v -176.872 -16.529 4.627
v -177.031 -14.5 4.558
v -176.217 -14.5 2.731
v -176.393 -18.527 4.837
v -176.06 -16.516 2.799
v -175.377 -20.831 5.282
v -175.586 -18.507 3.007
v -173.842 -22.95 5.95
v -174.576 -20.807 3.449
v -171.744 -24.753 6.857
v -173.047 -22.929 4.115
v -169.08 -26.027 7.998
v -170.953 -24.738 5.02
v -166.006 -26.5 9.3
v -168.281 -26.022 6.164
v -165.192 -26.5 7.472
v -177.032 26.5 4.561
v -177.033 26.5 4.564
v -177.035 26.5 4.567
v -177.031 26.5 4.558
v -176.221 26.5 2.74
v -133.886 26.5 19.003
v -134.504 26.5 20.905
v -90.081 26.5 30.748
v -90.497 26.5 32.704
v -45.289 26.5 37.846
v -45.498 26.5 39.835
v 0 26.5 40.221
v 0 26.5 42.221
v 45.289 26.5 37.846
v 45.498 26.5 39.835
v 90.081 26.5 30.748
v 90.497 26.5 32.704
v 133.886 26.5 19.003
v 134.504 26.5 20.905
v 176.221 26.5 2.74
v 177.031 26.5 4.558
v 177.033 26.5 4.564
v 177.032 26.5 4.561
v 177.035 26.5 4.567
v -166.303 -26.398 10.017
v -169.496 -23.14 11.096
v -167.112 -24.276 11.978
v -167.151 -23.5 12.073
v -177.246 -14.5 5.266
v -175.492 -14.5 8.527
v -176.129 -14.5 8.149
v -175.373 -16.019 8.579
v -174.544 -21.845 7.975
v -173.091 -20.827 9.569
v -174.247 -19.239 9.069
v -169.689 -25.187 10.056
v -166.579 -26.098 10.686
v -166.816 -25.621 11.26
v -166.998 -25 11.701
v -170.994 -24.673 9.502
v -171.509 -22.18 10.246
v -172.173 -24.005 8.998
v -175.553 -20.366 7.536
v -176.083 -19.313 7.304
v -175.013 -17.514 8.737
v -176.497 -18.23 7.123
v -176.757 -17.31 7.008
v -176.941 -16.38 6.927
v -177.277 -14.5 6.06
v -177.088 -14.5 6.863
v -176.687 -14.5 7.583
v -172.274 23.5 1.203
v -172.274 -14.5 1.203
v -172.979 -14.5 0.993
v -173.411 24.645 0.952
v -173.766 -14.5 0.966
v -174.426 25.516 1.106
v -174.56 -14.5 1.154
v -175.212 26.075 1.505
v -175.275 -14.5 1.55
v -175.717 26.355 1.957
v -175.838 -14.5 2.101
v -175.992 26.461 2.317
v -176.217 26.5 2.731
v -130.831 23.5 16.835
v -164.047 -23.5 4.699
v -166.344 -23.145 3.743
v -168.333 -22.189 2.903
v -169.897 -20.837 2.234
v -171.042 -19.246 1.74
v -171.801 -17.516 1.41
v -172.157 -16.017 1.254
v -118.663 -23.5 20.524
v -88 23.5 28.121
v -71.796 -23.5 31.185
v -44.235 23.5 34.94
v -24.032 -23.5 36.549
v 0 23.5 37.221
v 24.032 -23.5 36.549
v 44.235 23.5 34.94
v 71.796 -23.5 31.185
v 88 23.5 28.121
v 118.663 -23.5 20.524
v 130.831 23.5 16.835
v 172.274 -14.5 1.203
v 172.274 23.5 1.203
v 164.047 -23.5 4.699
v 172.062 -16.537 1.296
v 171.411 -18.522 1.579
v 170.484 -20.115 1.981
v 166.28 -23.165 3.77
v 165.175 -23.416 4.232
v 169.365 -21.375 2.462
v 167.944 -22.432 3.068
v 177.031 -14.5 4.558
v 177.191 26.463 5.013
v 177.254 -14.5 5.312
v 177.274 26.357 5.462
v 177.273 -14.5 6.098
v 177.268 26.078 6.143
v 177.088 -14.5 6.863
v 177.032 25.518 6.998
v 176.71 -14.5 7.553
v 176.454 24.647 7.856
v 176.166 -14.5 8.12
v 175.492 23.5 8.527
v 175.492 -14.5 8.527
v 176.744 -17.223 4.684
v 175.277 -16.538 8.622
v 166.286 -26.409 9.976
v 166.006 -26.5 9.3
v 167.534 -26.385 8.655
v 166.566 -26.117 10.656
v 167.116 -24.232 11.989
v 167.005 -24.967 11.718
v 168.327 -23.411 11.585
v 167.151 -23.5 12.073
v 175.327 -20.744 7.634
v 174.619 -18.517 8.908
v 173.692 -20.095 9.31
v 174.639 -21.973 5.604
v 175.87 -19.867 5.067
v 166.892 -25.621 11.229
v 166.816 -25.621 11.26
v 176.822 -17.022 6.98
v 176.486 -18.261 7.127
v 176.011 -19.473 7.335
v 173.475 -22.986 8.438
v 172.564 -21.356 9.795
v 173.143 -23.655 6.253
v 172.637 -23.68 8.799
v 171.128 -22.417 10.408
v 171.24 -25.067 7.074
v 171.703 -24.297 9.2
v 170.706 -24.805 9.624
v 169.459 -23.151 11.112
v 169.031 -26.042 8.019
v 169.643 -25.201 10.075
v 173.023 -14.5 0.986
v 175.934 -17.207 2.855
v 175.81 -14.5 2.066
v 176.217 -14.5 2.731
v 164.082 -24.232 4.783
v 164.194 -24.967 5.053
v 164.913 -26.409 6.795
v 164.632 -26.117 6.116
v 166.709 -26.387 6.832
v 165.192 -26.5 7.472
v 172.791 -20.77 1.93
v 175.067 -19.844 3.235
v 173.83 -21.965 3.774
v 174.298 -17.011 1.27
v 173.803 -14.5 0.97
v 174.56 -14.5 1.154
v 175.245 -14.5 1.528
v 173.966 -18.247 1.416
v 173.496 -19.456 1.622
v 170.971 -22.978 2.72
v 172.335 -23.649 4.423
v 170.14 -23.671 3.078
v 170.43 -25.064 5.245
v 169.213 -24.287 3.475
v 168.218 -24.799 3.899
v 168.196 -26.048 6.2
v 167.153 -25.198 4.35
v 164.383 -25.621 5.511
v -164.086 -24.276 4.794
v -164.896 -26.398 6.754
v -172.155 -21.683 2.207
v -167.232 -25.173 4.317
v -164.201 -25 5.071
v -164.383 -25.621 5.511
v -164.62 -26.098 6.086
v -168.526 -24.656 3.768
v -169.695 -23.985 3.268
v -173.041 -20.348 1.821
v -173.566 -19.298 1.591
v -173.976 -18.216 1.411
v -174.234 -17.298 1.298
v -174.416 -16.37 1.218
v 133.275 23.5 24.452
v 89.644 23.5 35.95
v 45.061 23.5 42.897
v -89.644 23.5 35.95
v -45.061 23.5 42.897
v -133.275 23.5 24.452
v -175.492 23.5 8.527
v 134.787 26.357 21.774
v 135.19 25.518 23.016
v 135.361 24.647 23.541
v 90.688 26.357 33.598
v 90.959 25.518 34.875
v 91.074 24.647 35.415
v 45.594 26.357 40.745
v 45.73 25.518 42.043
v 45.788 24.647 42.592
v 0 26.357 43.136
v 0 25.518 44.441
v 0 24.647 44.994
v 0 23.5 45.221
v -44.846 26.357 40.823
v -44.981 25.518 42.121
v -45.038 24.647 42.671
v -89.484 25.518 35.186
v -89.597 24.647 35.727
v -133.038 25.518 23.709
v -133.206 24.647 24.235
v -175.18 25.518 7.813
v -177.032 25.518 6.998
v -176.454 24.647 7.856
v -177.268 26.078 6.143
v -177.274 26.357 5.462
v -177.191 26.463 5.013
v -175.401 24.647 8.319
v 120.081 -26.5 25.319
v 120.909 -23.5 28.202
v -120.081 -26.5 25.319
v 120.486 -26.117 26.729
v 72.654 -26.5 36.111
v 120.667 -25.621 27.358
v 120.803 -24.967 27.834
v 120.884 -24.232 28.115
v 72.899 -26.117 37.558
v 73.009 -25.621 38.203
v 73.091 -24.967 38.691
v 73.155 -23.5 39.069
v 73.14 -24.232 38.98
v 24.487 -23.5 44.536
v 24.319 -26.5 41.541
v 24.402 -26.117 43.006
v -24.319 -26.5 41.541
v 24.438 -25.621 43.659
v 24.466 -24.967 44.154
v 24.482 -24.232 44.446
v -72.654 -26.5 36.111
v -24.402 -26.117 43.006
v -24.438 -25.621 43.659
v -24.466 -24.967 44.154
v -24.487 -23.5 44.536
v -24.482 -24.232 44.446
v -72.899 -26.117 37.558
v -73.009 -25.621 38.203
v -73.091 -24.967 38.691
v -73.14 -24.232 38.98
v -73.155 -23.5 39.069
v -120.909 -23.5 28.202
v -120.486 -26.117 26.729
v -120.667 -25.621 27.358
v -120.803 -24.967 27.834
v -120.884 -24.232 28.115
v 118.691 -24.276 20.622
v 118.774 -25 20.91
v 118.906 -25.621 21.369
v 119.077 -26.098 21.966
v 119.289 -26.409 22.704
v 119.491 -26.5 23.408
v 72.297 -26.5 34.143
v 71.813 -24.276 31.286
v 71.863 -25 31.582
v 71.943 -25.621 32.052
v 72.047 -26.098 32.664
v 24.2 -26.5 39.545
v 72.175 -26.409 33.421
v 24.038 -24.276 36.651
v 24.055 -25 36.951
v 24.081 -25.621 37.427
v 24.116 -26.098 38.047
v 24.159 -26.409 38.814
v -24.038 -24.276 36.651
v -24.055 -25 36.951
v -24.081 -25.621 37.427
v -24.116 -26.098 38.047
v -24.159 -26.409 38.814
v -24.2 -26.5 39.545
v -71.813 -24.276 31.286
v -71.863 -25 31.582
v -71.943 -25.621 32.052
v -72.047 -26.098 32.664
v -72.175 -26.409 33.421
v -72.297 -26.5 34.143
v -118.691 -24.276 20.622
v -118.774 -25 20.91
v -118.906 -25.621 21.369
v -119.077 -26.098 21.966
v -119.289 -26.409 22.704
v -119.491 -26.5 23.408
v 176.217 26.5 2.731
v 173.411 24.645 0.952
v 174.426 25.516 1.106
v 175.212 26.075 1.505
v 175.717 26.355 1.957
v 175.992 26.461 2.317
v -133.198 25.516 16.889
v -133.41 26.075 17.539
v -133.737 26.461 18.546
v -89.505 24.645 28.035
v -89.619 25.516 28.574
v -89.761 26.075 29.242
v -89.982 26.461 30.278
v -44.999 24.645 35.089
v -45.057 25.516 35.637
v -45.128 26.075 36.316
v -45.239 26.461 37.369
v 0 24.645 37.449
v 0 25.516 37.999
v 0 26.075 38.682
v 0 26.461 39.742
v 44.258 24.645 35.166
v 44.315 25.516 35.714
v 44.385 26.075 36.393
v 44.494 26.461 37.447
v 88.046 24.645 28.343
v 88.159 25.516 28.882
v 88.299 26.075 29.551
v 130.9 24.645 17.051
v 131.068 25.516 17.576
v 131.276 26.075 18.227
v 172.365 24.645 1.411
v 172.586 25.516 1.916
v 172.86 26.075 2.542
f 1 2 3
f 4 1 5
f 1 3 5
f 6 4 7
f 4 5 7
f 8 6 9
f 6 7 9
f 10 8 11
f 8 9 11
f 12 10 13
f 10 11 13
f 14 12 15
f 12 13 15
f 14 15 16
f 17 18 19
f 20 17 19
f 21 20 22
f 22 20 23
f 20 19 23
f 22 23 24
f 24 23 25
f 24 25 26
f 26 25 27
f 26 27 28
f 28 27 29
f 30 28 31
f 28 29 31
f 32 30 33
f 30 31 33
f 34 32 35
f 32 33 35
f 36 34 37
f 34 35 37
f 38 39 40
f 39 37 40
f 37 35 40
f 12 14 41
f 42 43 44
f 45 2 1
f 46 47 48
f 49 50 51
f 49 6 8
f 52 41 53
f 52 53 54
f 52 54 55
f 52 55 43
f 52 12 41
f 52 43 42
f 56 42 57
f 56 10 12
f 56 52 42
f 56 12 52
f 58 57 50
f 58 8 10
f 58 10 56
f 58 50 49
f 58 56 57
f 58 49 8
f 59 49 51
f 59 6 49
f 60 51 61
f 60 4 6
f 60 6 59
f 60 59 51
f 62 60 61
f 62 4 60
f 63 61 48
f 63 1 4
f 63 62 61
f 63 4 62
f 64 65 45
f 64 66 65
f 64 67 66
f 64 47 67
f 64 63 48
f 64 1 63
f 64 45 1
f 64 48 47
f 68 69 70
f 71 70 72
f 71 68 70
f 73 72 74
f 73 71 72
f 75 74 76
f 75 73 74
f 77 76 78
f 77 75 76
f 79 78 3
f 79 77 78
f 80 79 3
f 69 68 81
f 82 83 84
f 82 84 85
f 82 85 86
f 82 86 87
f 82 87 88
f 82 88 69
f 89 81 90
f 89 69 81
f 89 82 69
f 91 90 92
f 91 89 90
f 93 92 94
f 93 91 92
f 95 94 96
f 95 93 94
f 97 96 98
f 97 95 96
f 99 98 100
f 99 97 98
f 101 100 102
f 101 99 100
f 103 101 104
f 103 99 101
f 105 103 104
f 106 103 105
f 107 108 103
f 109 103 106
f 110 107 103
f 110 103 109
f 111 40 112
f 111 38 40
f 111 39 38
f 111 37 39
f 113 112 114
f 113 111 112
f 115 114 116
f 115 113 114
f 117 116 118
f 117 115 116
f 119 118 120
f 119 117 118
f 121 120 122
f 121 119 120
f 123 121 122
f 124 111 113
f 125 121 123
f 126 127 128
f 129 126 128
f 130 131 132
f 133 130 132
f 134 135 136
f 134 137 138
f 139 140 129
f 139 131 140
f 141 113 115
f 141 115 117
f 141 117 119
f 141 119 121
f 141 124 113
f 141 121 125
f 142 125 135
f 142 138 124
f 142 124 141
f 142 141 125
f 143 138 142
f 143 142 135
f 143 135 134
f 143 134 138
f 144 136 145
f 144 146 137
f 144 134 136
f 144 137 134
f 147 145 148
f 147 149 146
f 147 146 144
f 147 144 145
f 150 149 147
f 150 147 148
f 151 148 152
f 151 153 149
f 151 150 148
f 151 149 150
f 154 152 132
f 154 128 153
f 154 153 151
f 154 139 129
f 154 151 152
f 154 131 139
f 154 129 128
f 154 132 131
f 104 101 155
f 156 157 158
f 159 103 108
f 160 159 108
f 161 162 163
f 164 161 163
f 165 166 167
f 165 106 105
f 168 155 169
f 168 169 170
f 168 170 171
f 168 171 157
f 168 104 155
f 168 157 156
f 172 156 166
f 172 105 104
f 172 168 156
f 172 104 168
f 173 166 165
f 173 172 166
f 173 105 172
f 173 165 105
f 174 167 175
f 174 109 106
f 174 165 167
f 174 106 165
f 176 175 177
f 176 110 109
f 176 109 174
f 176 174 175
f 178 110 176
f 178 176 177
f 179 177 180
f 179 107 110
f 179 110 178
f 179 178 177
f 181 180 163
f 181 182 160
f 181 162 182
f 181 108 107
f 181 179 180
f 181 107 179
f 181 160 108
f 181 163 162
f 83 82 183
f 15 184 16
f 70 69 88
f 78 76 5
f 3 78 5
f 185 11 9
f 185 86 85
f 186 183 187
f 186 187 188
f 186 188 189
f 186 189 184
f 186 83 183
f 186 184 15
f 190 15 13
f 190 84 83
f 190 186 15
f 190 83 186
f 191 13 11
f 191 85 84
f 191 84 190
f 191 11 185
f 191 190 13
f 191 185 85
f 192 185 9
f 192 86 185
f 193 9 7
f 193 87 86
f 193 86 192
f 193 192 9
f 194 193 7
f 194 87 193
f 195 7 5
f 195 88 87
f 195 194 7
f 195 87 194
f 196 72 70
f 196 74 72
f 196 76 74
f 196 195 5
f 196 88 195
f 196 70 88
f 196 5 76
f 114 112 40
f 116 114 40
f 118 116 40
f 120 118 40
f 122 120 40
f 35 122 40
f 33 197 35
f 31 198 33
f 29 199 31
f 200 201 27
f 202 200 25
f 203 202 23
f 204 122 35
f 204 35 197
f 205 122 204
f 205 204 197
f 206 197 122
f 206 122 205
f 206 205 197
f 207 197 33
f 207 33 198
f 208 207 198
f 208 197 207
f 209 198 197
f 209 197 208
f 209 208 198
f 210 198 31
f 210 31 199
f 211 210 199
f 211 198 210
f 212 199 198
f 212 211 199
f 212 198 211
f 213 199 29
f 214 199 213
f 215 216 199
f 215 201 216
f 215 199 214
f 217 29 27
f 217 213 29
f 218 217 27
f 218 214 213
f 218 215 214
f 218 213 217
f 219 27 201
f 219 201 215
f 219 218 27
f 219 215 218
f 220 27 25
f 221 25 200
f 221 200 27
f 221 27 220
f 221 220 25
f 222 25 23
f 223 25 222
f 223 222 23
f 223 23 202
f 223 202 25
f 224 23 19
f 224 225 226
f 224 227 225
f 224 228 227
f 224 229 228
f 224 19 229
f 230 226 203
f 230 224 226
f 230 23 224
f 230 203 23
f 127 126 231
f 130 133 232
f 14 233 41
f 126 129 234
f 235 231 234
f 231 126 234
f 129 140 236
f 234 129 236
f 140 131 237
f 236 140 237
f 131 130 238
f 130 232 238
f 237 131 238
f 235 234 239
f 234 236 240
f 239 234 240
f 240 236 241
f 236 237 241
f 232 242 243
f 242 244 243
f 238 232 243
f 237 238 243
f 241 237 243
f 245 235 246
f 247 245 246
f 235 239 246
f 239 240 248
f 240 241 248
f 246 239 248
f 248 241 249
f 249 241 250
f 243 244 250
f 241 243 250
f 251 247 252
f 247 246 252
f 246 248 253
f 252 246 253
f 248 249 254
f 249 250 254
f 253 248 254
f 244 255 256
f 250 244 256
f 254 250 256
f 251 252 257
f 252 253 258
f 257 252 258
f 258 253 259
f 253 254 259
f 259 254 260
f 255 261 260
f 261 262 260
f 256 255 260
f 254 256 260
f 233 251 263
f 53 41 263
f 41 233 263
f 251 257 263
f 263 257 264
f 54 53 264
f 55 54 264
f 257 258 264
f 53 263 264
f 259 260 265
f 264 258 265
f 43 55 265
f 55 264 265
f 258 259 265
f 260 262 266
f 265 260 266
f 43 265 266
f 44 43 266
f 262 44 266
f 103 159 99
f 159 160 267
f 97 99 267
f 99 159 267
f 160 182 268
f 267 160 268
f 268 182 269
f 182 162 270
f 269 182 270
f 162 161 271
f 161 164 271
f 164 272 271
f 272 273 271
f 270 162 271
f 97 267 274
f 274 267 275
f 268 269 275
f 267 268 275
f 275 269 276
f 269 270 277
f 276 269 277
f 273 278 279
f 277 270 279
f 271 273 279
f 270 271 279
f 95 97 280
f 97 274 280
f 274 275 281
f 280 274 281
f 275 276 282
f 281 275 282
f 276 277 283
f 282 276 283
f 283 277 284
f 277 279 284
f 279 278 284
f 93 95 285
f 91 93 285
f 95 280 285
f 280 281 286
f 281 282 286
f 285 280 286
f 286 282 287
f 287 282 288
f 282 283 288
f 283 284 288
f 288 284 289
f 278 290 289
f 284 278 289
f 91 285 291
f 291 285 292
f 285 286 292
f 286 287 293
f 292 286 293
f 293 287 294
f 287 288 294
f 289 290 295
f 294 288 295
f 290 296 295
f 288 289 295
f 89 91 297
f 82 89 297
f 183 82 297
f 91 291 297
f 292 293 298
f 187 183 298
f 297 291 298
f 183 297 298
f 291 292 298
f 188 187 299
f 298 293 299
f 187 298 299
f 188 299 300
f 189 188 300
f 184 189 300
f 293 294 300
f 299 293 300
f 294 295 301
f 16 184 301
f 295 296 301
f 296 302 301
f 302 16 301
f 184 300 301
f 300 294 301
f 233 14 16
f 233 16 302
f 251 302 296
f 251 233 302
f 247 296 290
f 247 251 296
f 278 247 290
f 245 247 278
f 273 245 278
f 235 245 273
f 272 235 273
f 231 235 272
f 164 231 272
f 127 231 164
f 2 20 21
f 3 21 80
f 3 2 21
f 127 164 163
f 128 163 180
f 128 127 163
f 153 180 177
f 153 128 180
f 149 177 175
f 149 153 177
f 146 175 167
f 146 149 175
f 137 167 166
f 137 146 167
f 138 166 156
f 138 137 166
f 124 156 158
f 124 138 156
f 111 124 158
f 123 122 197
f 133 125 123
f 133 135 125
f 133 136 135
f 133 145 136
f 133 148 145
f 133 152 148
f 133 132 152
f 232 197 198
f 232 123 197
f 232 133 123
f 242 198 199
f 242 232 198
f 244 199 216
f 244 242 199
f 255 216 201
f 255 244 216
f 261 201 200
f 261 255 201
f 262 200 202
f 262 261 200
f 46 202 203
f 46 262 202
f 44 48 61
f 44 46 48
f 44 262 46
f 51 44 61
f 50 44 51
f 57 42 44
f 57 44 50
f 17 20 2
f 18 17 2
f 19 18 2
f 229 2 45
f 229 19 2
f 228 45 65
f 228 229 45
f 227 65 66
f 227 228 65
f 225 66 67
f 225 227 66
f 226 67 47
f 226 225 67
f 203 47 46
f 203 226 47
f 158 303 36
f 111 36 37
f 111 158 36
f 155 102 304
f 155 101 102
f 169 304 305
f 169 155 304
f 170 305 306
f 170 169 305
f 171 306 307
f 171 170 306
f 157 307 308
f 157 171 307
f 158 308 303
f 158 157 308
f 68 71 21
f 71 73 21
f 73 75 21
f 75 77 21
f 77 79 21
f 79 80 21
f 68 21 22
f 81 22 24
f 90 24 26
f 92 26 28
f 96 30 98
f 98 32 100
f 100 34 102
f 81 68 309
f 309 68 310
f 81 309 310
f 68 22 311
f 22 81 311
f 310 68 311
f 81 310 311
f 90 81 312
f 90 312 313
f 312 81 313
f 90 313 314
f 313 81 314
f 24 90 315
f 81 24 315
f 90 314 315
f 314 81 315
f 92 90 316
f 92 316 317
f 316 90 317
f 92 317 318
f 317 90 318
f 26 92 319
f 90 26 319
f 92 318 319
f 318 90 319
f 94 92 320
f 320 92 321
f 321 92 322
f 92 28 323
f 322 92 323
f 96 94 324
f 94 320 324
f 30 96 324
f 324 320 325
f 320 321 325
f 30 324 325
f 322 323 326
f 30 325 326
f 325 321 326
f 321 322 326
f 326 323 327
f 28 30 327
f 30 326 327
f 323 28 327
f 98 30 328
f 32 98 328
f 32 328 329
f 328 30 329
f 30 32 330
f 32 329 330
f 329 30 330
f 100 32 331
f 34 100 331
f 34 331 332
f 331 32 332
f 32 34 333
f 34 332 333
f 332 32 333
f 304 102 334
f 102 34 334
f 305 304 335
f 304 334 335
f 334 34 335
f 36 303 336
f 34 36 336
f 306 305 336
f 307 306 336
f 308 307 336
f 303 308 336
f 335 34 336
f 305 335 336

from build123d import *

# Parameters (mm, degrees)
F1_DEPTH = 26.5
F2_R     = 12
F3_R     = 3


with BuildPart() as f1:
    # F0 (on Front) → F1 (new body, symmetric)
    with BuildSketch(Plane.XZ):
        with BuildLine():
            ThreePointArc((-175, 0), (0, 37.221436), (175, 0))
            Line((175, 0), (178.255814, 7.307508))
            ThreePointArc((178.255814, 7.307508), (0, 45.221436), (-178.255814, 7.307508))
            Line((-178.255814, 7.307508), (-175, 0))
        make_face()
    extrude(amount=F1_DEPTH, both=True)

    # F2
    f2_edges = [f1.edges().sort_by_distance(p)[0] for p in [
        (-176.627907, -26.5, 3.653754),
        (176.627907, -26.5, 3.653754),
    ]]
    fillet(f2_edges, radius=F2_R)

    # F3
    f3_edges = [f1.edges().sort_by_distance(p)[0] for p in [
        (175, 6, 0),
        (171.783213, -22.985785, 1.417489),
        (0, 26.5, 37.221436),
        (0, -26.5, 37.221436),
        (-175, 6, 0),
        (-171.783212, -22.985786, 1.417489),
        (178.255814, 6, 7.307508),
        (175.03915, -22.985767, 8.72523),
        (0, 26.5, 45.221436),
        (0, -26.5, 45.221436),
        (-178.255814, 6, 7.307508),
        (-175.03915, -22.985767, 8.725229),
    ]]
    fillet(f3_edges, radius=F3_R)


solid = f1.part
